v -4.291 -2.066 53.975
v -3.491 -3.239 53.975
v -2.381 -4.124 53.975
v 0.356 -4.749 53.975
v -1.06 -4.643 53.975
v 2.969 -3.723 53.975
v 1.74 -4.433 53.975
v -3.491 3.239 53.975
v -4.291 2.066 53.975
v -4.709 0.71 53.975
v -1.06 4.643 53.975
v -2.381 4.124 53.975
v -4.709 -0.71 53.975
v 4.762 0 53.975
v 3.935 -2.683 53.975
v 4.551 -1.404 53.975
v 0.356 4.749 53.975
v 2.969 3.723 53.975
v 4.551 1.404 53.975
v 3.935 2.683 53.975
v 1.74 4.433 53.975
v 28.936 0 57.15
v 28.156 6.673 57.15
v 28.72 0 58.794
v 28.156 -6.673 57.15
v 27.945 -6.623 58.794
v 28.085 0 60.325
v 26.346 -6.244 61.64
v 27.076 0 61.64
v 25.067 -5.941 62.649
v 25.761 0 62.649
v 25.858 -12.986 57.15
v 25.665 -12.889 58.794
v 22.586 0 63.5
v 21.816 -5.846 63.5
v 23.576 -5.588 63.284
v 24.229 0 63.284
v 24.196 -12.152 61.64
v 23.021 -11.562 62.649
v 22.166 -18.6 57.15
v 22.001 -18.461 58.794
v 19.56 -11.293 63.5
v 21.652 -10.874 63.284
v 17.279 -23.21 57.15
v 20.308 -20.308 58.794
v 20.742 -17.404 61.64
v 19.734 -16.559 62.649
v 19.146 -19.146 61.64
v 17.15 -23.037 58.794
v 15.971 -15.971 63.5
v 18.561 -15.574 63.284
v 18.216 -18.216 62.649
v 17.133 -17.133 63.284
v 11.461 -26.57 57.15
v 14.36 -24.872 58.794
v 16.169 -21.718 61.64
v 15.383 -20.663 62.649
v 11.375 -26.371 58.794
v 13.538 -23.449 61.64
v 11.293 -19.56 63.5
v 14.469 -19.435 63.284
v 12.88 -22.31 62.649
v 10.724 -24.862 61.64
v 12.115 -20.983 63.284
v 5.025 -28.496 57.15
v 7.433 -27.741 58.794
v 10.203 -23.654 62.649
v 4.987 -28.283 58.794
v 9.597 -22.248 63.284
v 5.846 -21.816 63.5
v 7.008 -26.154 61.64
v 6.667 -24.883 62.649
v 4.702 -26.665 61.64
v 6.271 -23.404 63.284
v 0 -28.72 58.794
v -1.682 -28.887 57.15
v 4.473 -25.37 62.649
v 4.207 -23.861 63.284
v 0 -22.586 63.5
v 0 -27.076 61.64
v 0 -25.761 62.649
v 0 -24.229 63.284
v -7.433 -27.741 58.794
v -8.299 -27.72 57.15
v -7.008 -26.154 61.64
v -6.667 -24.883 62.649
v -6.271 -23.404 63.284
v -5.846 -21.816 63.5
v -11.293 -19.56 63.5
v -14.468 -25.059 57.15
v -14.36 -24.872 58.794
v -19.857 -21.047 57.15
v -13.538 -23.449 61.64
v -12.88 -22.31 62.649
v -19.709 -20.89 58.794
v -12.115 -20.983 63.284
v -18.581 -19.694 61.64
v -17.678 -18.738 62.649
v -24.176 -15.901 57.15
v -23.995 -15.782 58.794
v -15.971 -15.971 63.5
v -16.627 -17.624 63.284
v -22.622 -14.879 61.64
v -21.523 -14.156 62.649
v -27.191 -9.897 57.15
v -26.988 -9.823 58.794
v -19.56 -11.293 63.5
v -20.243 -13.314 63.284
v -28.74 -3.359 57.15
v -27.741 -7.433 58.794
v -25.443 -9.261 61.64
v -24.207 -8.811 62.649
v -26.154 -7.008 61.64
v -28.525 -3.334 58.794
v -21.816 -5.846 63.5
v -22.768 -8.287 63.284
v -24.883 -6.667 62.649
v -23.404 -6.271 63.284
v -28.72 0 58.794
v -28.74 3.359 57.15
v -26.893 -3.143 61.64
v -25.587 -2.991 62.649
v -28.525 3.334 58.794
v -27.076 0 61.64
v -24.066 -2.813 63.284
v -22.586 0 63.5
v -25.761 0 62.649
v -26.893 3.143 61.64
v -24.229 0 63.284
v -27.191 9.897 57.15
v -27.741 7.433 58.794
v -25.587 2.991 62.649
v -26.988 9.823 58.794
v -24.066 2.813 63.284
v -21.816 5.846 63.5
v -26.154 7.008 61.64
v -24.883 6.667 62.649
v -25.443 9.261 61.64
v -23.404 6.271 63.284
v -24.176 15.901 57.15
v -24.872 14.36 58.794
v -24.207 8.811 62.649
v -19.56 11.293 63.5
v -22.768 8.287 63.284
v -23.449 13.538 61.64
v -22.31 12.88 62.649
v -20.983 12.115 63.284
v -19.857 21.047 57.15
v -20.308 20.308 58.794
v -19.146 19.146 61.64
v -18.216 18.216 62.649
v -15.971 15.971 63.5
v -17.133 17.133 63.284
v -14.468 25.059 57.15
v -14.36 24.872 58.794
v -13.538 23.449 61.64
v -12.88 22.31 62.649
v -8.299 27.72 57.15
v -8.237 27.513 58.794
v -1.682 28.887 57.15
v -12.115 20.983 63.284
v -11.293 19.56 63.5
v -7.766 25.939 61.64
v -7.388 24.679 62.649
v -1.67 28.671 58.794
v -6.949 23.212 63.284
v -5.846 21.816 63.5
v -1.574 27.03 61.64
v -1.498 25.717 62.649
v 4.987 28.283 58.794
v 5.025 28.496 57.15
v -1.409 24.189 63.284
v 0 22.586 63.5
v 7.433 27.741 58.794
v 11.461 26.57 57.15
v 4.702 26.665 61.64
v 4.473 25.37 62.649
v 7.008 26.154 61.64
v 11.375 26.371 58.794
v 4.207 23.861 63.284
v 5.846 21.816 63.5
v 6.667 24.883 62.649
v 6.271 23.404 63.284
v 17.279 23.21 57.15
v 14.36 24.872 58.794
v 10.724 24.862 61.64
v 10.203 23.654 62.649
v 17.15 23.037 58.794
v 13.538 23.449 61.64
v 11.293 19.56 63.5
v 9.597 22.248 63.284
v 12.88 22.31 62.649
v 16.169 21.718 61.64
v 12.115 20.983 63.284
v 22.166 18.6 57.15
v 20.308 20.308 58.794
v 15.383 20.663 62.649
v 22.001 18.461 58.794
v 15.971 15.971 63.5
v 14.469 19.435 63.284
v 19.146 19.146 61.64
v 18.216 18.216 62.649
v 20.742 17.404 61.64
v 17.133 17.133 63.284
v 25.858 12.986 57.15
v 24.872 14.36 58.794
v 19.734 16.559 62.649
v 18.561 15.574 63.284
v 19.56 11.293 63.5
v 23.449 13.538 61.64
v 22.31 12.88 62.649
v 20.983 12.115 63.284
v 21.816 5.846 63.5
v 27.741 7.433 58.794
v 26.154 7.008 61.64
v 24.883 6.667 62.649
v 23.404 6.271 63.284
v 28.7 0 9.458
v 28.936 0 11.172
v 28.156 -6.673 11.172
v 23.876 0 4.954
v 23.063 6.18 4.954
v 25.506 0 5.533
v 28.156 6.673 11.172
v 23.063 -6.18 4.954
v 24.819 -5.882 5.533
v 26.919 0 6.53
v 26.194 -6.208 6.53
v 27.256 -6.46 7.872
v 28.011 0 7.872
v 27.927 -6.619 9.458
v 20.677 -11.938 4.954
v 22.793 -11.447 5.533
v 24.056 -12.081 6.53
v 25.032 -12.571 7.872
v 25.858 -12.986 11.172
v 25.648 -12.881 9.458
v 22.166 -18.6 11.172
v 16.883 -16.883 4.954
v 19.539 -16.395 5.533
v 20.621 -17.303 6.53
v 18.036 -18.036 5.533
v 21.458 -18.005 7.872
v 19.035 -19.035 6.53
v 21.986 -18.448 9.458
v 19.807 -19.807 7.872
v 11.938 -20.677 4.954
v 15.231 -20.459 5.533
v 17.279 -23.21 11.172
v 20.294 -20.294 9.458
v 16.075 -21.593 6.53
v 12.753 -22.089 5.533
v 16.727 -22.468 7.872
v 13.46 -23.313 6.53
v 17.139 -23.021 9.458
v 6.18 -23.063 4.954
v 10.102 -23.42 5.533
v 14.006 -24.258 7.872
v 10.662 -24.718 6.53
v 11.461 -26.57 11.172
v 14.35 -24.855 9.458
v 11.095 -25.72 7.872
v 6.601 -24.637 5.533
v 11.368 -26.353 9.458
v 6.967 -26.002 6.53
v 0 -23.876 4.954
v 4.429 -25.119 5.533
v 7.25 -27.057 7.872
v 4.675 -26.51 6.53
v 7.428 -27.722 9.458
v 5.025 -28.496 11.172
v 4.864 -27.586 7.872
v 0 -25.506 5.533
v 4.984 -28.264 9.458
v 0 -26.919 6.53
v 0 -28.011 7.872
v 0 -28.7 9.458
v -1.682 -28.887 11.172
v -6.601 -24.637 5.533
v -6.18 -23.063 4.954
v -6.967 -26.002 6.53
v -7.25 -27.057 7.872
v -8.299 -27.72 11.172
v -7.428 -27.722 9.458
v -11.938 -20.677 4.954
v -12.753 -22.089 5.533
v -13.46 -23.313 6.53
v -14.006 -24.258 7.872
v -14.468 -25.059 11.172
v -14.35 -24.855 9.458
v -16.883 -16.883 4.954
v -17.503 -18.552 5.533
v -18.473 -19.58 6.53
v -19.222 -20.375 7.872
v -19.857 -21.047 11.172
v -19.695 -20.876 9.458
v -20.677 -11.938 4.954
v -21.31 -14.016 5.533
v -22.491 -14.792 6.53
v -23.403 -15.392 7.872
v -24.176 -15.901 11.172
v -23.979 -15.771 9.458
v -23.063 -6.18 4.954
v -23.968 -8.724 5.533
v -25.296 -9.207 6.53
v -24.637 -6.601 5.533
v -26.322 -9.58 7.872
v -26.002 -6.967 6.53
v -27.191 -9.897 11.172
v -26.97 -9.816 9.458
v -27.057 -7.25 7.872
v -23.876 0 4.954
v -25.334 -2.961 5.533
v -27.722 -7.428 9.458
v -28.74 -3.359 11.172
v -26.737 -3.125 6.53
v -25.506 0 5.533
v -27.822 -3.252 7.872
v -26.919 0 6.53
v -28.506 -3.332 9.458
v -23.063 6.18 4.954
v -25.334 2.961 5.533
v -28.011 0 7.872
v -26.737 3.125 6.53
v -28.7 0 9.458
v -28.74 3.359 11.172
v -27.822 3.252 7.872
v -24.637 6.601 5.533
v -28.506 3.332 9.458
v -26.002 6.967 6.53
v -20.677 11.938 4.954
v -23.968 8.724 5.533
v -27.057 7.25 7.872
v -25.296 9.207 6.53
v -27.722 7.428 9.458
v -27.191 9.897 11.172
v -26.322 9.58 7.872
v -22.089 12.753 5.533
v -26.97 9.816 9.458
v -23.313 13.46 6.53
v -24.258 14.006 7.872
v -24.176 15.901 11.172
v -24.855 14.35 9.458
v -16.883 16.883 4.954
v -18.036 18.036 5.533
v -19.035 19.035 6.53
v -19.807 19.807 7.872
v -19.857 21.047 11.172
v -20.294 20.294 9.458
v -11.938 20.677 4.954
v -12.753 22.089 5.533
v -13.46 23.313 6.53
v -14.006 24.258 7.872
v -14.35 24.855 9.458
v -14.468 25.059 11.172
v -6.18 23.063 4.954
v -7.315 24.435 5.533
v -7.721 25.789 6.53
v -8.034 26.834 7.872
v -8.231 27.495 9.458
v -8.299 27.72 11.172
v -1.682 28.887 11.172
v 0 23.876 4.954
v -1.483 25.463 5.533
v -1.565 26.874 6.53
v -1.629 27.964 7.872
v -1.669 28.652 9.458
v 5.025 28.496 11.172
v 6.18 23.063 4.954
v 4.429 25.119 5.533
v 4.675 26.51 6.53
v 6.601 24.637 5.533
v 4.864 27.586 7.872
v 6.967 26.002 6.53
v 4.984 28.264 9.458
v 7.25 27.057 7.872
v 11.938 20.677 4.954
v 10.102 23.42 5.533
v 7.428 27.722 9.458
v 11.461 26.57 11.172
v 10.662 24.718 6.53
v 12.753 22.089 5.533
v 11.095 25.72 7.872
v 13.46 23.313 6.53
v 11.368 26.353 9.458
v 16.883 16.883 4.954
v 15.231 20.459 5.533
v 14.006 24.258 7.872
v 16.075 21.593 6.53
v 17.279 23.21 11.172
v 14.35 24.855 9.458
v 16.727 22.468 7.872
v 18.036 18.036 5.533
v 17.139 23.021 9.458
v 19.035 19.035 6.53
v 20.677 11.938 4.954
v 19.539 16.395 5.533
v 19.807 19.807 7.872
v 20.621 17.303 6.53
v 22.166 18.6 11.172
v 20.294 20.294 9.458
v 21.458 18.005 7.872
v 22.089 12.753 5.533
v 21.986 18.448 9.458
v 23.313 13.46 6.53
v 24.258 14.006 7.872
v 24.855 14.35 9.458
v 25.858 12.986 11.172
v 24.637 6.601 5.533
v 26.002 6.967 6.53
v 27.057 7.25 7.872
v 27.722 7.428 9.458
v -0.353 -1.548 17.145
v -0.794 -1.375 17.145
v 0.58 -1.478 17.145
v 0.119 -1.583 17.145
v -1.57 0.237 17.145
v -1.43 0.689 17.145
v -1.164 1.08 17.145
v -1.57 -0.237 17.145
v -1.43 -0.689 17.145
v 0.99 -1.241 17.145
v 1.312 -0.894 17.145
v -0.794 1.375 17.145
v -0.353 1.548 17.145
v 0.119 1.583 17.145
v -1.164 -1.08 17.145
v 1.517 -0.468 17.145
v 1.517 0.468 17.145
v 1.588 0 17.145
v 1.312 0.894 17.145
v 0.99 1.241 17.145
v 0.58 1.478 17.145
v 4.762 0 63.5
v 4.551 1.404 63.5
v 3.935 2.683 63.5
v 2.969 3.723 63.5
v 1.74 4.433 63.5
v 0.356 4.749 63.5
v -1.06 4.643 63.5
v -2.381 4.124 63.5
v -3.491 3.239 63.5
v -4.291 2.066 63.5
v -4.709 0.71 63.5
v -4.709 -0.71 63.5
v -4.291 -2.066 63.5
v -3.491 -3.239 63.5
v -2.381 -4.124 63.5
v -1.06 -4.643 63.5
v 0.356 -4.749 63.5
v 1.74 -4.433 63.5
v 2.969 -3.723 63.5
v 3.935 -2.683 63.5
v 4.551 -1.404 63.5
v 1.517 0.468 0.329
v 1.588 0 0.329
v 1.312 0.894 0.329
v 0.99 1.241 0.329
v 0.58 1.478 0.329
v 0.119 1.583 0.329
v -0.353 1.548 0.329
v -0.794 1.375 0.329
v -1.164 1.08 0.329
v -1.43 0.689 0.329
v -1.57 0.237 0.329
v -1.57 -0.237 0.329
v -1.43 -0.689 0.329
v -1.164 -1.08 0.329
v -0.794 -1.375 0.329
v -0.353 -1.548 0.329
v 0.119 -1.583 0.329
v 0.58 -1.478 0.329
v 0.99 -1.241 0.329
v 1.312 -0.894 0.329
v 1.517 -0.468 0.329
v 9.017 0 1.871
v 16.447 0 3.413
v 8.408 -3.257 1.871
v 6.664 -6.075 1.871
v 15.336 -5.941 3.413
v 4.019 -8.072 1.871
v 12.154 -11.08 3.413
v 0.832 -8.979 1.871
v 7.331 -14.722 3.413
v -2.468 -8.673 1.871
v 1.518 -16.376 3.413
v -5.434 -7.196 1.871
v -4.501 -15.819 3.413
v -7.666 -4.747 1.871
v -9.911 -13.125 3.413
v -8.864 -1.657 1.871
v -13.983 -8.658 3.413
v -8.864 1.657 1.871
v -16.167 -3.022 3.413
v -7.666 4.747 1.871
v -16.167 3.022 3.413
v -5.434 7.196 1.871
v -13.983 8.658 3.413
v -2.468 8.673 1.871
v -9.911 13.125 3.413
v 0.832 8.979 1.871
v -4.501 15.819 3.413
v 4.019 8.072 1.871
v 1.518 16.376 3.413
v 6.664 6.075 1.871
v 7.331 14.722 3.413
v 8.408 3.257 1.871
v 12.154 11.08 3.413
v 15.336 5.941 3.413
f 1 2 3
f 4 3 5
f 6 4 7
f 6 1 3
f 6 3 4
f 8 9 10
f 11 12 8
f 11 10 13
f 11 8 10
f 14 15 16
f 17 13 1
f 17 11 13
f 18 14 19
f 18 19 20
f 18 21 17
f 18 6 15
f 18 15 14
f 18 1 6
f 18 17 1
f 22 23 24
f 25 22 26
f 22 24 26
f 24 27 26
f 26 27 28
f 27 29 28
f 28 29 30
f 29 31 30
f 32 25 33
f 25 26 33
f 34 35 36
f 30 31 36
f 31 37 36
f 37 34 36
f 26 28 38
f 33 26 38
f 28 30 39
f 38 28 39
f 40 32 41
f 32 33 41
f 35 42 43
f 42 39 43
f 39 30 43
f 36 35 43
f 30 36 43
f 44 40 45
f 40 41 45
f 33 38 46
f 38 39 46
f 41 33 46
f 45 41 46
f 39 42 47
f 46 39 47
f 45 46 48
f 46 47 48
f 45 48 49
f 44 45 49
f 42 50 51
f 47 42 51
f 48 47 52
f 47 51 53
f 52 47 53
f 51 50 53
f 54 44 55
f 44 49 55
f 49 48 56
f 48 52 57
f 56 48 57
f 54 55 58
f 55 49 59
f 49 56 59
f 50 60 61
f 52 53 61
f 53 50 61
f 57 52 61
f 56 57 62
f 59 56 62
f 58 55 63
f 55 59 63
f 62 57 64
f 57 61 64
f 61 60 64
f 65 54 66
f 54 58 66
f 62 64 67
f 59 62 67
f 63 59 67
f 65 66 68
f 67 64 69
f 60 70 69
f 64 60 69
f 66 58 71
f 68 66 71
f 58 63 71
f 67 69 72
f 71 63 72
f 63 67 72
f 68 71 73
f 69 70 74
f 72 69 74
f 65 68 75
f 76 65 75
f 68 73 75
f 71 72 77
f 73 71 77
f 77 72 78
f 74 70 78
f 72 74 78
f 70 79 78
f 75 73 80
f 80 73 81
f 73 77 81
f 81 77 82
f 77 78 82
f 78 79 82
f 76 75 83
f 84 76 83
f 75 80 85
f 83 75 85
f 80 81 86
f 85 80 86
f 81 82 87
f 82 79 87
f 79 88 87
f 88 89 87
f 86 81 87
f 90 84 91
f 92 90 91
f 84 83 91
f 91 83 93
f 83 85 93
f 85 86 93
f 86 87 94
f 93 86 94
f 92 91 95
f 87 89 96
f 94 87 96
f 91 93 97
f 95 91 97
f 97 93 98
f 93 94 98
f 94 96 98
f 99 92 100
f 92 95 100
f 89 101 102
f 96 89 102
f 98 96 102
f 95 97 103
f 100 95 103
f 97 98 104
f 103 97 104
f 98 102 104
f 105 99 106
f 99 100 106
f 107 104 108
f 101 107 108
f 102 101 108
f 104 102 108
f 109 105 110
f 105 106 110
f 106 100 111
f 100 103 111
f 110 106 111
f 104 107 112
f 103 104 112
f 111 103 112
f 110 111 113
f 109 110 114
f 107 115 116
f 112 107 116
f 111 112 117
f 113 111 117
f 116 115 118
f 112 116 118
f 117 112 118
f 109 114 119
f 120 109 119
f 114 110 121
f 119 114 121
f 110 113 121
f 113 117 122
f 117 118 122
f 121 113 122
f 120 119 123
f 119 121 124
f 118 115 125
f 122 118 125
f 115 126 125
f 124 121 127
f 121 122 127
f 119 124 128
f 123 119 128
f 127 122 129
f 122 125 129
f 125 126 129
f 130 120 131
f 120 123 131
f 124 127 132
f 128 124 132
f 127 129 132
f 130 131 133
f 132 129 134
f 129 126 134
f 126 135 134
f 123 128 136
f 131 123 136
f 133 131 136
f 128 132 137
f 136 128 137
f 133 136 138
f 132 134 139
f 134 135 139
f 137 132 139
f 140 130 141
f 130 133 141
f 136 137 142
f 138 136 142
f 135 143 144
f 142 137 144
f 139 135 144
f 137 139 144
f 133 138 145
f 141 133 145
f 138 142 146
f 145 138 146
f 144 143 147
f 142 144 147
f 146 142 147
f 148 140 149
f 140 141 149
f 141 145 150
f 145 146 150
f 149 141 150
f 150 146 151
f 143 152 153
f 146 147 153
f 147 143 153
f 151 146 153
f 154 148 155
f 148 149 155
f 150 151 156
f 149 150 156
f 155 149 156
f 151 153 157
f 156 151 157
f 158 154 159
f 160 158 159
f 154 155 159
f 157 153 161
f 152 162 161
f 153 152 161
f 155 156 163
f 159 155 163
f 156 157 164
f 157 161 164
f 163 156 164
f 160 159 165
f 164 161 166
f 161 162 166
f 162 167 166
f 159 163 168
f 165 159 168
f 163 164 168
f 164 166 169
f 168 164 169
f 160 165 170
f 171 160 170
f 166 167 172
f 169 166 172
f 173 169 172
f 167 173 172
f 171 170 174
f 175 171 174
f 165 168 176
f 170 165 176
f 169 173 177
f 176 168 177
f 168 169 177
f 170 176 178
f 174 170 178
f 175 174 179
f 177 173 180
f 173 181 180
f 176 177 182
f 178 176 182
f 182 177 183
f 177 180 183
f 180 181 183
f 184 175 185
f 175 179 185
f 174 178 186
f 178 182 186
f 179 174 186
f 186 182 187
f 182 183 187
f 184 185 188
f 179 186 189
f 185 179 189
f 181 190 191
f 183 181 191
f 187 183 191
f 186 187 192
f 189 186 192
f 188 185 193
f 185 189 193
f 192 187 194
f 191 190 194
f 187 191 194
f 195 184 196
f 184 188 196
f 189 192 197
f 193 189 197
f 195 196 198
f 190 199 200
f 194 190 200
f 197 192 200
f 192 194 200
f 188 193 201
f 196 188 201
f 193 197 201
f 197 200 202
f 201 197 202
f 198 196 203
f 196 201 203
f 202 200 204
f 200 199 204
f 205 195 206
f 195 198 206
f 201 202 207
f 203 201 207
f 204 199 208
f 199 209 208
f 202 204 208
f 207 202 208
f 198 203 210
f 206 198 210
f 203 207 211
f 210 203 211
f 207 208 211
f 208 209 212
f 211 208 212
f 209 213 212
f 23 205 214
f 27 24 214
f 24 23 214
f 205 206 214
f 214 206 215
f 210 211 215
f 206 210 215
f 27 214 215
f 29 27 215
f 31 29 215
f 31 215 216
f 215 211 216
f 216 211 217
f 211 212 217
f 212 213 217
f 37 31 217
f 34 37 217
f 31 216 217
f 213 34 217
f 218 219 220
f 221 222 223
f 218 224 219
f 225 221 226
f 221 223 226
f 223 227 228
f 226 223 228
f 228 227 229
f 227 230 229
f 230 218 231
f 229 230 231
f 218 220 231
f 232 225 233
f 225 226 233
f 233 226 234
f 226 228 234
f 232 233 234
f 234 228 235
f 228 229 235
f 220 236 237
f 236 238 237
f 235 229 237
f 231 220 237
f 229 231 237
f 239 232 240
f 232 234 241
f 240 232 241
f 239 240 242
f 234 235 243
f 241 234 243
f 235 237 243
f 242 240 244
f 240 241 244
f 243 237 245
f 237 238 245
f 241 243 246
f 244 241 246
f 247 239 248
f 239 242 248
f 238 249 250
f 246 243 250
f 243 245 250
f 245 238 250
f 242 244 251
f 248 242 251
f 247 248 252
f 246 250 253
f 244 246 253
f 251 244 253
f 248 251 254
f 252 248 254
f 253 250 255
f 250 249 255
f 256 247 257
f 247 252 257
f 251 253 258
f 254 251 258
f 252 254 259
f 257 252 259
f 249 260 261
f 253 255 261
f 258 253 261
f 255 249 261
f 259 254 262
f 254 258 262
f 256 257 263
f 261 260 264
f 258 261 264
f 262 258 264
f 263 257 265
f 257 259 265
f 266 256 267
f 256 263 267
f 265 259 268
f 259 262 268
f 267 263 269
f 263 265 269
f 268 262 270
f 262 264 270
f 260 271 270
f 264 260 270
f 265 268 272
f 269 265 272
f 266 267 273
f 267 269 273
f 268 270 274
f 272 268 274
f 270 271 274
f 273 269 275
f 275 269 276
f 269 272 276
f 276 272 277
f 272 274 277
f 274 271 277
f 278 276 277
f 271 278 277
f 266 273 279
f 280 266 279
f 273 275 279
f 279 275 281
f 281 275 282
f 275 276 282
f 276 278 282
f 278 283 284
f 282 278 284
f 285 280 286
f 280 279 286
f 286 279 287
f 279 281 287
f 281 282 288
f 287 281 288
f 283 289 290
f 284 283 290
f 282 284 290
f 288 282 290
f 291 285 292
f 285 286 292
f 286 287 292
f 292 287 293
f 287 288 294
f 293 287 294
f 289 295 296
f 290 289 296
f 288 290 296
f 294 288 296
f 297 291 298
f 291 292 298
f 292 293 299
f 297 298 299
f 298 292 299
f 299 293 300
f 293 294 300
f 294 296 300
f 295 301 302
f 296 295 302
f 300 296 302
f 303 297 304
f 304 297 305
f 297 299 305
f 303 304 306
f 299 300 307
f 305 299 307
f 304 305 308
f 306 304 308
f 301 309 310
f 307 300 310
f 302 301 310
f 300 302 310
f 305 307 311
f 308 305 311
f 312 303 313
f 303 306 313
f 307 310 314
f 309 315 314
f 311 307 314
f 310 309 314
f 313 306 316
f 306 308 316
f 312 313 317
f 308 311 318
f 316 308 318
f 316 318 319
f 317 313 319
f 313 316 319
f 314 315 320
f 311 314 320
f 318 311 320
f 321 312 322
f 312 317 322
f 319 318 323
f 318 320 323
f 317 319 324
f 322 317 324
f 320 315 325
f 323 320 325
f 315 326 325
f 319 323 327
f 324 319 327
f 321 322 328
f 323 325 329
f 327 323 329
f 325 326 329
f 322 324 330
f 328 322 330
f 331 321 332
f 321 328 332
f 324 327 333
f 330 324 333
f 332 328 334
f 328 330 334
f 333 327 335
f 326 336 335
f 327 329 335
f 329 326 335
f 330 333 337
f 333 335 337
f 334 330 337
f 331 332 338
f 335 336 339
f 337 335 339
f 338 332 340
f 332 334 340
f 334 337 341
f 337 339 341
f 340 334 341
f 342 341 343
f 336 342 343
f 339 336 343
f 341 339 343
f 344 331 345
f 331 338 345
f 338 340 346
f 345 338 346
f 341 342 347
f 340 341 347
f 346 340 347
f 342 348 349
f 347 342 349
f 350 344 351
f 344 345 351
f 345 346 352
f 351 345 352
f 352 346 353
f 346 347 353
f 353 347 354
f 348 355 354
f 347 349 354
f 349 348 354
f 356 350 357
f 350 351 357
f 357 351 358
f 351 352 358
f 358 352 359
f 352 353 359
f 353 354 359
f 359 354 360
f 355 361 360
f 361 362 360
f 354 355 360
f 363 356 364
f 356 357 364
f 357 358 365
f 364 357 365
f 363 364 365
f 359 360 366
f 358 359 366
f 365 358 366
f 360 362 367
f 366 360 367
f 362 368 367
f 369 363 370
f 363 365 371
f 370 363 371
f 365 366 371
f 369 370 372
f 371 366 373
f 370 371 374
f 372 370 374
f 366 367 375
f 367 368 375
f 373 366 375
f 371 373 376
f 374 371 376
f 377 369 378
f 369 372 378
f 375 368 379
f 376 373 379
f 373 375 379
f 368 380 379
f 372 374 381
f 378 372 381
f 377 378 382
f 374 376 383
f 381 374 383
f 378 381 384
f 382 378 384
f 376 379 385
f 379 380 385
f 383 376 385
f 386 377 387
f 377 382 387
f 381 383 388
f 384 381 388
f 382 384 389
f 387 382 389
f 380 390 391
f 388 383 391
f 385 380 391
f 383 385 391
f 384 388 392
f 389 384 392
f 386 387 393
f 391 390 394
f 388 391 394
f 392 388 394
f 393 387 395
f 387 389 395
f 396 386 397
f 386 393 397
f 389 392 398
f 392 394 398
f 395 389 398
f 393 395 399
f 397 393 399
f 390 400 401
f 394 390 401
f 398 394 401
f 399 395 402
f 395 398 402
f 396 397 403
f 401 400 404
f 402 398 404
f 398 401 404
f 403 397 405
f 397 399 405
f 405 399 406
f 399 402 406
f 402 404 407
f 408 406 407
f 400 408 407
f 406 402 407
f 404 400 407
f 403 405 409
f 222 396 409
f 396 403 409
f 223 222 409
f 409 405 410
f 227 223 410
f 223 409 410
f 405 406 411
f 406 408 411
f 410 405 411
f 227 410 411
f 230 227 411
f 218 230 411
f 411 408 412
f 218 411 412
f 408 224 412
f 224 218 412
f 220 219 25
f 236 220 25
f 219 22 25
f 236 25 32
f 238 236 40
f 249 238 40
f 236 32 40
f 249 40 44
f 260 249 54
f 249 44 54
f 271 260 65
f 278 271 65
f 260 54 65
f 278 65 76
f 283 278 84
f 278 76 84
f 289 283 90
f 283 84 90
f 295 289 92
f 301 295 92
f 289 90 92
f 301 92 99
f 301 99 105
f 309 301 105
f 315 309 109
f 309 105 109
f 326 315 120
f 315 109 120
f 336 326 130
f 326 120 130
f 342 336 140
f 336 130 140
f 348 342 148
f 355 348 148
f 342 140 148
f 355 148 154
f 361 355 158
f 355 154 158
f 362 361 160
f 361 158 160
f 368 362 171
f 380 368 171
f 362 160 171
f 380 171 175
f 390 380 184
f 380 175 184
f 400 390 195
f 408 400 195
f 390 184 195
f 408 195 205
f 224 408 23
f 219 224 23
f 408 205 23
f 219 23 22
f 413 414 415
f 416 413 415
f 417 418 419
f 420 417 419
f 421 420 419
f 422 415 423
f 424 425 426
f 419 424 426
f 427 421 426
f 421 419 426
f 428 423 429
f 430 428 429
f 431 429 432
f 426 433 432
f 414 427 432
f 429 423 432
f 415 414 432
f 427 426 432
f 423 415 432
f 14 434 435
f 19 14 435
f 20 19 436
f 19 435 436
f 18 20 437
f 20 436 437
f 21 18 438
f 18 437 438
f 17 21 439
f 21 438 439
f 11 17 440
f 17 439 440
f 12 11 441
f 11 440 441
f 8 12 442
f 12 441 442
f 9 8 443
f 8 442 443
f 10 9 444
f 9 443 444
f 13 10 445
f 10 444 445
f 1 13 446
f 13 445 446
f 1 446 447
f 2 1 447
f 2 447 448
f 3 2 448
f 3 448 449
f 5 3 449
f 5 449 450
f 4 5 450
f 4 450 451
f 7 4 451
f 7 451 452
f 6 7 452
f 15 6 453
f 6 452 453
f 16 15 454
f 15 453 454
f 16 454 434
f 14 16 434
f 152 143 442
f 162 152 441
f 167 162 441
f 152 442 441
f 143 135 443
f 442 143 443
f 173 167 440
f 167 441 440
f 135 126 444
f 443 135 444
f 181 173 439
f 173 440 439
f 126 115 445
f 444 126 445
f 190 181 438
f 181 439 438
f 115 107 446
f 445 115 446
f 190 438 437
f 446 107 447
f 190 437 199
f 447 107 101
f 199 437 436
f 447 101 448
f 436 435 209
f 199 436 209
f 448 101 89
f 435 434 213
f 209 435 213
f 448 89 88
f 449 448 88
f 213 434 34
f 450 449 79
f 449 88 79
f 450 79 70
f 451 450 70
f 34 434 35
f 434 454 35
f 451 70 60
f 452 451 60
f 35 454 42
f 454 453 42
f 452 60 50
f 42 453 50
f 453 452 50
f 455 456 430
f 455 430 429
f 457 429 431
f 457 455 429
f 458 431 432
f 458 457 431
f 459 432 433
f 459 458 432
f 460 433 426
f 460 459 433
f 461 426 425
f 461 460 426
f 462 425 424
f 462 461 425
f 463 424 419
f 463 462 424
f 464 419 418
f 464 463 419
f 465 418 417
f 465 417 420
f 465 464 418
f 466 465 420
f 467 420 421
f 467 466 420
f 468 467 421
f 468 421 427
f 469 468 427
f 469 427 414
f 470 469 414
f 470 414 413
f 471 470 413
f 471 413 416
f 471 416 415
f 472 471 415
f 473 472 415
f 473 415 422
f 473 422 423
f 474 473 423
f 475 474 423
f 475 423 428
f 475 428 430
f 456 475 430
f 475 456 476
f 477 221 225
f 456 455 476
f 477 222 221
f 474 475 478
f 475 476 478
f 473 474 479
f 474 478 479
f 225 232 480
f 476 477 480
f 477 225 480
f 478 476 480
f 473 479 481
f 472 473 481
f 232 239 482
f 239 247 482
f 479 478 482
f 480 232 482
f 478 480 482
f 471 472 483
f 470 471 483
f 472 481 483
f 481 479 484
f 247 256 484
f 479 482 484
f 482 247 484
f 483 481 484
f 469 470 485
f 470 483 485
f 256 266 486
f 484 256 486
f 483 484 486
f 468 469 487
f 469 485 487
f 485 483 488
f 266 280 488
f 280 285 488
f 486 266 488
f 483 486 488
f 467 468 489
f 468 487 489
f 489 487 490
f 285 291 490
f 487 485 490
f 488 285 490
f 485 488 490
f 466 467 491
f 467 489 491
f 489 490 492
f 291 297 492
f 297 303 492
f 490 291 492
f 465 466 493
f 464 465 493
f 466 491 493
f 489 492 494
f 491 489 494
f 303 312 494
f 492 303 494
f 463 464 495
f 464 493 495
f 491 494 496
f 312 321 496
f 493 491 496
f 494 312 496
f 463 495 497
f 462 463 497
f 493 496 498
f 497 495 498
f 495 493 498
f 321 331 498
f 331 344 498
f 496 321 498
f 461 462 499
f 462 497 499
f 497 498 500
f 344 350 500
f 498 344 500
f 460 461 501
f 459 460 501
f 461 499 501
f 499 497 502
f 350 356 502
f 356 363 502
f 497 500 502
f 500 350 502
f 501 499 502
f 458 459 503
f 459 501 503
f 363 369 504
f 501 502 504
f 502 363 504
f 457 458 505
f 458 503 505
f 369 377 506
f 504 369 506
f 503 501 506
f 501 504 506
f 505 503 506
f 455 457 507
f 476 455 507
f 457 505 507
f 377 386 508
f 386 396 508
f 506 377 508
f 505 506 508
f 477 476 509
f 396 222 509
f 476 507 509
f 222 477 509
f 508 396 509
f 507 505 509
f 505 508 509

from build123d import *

# Parameters (mm, degrees)
F2_R     = 4.7625
F3_DEPTH = 9.525
F4_R     = 1.5875
F5_DEPTH = 17.145


with BuildPart() as f1:
    # F0 (on Front) → F1 (revolve)
    with BuildSketch(Plane.XZ):
        with BuildLine():
            Line((0, 63.5), (0, 0))
            Line((0, 0), (23.876184, 4.954478))
            ThreePointArc((23.876184, 4.954478), (27.511198, 7.163922), (28.935999, 11.172028))
            Line((28.935999, 11.172028), (28.935999, 57.15))
            ThreePointArc((28.935999, 57.15), (27.076127, 61.640128), (22.585999, 63.5))
            Line((22.585999, 63.5), (0, 63.5))
        make_face()
    revolve(axis=Axis((0, 0, 31.75), (0, 0, -1)))

    # F2 (on face) → F3 (cut)
    with BuildSketch(Plane.XY.offset(63.5)):
        Circle(F2_R)
    extrude(amount=-F3_DEPTH, mode=Mode.SUBTRACT)

    # F4 (on Top) → F5 (cut)
    with BuildSketch(Plane.XY):
        Circle(F4_R)
    extrude(amount=F5_DEPTH, mode=Mode.SUBTRACT)


solid = f1.part
